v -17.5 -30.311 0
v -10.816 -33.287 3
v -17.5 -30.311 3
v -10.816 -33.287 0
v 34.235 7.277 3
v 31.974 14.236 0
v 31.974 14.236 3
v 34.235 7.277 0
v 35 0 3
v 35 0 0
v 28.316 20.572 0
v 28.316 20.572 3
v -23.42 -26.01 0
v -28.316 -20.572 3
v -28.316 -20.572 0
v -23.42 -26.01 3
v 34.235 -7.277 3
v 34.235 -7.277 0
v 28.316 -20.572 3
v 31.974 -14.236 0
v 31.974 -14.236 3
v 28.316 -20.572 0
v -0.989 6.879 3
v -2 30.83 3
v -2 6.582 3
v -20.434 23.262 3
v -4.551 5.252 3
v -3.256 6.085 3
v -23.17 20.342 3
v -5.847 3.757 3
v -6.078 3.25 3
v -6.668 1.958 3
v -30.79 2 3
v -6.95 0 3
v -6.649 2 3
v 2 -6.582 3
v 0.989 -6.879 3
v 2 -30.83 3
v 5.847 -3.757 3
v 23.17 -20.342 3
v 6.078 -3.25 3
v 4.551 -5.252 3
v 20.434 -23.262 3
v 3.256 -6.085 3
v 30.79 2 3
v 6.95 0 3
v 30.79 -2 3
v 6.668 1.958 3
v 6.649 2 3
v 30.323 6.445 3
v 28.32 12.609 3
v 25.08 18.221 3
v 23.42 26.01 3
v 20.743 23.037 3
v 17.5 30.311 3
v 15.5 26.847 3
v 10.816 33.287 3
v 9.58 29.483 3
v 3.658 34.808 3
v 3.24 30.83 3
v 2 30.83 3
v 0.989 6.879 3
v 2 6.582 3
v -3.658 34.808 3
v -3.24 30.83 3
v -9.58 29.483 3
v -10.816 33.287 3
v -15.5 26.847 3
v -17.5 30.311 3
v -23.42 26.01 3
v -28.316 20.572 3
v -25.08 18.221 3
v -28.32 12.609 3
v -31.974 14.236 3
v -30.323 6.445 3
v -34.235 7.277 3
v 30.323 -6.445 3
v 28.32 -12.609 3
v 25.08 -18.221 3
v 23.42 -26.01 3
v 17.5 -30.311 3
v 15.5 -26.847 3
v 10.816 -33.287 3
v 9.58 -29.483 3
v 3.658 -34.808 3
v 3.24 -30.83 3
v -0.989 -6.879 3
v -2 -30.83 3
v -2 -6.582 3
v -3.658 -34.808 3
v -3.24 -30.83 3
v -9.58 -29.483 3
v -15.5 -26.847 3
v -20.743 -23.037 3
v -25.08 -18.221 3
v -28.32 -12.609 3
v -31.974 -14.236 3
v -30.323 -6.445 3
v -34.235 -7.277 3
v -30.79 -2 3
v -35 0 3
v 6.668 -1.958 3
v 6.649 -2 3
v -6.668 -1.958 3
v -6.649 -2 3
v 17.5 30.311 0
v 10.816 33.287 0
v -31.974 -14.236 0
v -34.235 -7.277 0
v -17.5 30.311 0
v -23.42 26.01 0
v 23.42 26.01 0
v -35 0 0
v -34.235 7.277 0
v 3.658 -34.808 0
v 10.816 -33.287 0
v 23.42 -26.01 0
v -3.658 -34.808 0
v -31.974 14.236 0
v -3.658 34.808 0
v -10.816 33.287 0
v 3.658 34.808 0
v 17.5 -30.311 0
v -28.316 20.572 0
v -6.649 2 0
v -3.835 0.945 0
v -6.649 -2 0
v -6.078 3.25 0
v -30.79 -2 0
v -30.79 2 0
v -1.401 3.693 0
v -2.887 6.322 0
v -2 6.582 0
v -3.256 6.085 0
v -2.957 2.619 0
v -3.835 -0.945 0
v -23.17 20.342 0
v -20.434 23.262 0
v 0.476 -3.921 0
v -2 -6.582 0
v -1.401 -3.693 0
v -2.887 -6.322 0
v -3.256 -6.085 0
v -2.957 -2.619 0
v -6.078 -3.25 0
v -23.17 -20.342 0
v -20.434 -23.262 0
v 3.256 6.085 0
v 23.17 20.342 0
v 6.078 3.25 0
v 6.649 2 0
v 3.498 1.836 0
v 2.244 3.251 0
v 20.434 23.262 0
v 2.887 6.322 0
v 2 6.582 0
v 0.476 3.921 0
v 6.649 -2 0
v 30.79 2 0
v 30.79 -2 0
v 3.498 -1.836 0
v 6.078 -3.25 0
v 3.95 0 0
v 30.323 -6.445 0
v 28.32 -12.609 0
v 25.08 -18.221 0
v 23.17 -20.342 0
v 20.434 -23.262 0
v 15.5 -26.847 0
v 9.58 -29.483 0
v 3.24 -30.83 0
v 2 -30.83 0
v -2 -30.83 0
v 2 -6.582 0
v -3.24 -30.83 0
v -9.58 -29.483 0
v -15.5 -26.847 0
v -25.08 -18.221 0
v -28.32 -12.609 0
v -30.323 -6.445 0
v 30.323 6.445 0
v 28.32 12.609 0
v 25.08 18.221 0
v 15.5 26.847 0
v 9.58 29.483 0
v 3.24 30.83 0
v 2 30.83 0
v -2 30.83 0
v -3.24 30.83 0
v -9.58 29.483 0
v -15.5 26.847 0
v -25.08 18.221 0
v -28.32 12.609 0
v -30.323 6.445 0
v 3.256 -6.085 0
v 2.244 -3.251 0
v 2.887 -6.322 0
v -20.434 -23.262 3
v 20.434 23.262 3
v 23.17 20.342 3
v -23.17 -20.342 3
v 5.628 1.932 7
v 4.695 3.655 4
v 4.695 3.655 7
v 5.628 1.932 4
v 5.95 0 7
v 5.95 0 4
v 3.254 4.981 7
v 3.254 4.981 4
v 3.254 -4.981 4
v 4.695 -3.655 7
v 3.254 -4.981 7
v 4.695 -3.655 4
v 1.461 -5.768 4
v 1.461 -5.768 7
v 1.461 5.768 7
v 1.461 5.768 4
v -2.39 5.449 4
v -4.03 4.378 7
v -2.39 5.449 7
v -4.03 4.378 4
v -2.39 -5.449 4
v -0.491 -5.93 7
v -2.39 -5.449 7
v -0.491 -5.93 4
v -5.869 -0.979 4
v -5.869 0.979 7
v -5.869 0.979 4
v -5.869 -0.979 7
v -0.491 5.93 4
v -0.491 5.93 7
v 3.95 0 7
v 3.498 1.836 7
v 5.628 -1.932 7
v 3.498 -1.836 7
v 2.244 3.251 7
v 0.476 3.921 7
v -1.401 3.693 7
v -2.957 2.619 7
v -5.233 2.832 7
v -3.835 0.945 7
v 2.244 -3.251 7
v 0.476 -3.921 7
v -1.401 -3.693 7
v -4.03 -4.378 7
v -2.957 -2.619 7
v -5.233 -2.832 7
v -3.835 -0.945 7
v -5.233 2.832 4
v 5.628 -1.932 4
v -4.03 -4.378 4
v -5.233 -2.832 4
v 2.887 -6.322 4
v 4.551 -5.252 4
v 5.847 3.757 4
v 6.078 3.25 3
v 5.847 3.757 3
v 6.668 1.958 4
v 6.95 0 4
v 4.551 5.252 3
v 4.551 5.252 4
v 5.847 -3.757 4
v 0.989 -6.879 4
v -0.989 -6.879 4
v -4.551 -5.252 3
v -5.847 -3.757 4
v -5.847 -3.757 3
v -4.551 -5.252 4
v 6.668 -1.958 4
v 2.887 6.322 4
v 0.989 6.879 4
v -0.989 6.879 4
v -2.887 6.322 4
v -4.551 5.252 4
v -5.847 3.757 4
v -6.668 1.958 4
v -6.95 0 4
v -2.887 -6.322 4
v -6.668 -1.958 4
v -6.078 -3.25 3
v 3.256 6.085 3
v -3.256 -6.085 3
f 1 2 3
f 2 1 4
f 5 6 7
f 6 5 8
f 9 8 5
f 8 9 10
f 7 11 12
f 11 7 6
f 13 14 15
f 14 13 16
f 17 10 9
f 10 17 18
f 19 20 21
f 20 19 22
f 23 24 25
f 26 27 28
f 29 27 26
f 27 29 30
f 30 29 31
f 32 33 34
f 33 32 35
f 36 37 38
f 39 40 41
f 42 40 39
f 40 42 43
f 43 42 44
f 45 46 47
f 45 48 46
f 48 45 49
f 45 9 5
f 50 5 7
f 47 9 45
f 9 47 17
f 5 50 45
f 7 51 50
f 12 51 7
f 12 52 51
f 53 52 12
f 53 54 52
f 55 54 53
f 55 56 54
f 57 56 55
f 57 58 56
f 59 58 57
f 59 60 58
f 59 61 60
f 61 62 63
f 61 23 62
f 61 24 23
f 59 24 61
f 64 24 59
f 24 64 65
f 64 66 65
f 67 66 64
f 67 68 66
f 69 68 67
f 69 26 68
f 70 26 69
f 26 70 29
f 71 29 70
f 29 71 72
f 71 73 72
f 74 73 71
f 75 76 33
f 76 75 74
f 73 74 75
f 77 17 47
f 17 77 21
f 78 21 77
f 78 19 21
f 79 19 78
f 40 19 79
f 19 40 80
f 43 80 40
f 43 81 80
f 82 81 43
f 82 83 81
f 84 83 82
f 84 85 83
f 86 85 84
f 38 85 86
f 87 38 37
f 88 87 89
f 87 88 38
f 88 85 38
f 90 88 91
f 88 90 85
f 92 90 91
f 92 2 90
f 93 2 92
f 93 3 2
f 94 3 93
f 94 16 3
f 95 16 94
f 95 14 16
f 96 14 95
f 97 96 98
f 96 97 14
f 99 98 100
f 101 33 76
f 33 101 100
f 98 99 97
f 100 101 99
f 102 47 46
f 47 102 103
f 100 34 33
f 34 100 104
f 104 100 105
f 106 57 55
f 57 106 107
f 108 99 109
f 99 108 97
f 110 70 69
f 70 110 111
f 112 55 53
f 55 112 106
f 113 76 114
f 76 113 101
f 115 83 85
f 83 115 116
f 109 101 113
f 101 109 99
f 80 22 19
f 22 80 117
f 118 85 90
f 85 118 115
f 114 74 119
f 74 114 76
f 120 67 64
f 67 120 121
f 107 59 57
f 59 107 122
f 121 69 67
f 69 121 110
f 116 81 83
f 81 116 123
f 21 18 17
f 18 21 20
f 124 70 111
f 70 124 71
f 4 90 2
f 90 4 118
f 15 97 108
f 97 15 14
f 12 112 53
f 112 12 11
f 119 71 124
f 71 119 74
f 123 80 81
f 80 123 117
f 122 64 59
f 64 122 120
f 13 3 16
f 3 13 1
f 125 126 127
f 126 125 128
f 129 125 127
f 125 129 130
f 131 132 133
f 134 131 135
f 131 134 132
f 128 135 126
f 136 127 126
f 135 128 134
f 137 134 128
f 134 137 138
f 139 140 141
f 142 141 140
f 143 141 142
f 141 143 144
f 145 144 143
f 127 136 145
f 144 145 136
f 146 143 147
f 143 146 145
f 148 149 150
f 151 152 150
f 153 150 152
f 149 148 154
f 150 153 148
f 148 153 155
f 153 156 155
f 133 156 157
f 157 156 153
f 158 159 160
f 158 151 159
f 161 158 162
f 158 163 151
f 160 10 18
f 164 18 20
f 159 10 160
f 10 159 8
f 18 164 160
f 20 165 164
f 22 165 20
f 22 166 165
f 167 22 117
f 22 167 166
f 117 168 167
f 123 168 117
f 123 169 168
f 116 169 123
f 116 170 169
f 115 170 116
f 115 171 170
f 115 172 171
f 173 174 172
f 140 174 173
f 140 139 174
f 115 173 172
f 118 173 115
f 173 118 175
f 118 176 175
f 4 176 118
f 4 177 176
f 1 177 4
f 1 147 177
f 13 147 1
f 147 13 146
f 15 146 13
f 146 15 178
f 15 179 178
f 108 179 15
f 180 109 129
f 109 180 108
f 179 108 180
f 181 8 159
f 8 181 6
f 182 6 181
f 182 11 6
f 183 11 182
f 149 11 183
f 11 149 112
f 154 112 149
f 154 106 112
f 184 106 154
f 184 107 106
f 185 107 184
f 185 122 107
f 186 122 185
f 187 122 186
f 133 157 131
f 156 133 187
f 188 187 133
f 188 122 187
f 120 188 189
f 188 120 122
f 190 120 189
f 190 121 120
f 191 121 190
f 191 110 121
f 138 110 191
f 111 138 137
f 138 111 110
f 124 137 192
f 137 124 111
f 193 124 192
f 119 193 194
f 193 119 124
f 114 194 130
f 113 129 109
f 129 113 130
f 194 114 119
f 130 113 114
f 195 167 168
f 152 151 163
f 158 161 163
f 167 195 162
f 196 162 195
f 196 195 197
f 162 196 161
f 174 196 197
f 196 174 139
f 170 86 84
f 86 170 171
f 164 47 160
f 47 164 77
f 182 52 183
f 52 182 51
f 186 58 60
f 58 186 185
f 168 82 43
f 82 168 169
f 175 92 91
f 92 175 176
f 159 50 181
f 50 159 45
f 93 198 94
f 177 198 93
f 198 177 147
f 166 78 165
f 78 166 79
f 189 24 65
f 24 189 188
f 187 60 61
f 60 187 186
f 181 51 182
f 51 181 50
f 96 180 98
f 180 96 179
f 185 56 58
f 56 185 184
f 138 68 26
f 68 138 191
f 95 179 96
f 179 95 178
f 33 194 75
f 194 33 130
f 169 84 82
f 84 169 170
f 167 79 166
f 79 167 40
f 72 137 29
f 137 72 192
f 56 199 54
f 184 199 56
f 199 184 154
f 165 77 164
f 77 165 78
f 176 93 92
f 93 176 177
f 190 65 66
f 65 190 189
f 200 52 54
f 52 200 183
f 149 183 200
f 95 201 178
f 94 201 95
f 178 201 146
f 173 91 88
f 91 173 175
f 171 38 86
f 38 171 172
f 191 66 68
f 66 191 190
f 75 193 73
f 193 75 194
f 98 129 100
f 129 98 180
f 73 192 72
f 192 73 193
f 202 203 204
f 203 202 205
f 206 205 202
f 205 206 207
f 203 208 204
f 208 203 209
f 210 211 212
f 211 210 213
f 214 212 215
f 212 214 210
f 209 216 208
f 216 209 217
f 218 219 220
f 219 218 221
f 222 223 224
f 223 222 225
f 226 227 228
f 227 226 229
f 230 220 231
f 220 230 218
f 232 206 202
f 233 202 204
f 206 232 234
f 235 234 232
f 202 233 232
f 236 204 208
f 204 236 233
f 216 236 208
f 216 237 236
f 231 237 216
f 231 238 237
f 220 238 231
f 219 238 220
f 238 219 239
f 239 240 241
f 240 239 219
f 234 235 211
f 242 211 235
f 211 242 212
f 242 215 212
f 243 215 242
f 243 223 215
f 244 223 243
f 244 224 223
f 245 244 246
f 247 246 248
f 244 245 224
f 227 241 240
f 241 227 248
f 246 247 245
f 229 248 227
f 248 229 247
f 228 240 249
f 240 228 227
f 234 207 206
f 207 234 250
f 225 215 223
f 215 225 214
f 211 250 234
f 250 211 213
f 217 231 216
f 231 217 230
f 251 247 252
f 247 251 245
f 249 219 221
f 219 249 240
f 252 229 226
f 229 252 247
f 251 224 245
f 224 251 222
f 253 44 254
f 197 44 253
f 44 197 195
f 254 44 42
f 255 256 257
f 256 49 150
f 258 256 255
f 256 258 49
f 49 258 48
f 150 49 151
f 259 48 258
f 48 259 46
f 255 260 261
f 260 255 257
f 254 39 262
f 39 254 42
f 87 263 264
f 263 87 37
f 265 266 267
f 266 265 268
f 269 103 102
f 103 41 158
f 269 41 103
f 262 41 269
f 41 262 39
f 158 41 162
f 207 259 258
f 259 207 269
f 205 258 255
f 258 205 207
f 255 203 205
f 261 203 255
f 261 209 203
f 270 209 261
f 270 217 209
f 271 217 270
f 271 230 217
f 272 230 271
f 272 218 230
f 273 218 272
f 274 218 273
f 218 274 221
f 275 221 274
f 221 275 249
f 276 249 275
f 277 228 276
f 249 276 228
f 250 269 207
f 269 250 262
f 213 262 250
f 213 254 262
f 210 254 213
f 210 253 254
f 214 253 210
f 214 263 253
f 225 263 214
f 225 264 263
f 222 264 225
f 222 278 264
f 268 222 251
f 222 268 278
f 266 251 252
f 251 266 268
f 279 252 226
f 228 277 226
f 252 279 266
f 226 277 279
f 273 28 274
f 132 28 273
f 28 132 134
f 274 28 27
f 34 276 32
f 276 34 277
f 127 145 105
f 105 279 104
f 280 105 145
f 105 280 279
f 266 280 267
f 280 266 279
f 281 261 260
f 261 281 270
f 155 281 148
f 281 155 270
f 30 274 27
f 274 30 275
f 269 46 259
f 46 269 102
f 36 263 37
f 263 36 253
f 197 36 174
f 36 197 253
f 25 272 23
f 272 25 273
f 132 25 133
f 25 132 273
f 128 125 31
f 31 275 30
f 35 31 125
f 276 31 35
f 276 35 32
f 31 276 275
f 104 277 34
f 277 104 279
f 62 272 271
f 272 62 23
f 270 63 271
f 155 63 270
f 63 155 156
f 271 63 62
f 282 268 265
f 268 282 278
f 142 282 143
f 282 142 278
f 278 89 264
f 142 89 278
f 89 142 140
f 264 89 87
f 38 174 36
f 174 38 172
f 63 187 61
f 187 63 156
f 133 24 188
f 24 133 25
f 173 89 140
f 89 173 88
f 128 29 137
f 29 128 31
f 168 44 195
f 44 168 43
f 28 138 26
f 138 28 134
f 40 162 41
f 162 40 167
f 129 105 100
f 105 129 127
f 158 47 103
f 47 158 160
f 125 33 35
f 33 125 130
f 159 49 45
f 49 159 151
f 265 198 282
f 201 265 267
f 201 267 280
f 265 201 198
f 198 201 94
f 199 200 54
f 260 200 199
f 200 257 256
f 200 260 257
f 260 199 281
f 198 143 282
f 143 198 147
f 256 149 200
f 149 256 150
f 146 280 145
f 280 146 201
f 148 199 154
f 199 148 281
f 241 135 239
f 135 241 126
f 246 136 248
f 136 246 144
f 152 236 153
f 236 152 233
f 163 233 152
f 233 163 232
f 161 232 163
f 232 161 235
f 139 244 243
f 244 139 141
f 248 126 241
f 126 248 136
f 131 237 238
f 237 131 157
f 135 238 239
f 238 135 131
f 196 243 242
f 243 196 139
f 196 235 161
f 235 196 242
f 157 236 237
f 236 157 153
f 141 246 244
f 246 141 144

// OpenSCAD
holderDiameter = 11.90;

difference() {
    origin();
    translate([0,0,-1]) cylinder(h = 10, d = holderDiameter - 4, center = false); 
}

module origin() {
    
    //first level holder
    translate([0,0,0]) cylinder(h = 7, d = holderDiameter, center = false);    

    //second level holder
    translate([0,0,0]) cylinder(h = 4, d = holderDiameter + 2, center = false);    

    difference() {
        cylinder(h = 3, d = 70, center = false);
        translate([0,0,-1]) cylinder(h = 10, d = 62, center = false);
    };

    rotate(0)
        frameLine();
    rotate(45)
        frameLine();
    rotate(90)
        frameLine();
    rotate(135)
        frameLine();

}

module frameLine () {
    frameLineLength = 65;
    frameLinewidth = 4;
    frameLineHeight = 3;
    
    translate([-frameLinewidth/2,-frameLineLength/2,0]) 
        cube([frameLinewidth,frameLineLength, frameLineHeight], center = false);
    
}
